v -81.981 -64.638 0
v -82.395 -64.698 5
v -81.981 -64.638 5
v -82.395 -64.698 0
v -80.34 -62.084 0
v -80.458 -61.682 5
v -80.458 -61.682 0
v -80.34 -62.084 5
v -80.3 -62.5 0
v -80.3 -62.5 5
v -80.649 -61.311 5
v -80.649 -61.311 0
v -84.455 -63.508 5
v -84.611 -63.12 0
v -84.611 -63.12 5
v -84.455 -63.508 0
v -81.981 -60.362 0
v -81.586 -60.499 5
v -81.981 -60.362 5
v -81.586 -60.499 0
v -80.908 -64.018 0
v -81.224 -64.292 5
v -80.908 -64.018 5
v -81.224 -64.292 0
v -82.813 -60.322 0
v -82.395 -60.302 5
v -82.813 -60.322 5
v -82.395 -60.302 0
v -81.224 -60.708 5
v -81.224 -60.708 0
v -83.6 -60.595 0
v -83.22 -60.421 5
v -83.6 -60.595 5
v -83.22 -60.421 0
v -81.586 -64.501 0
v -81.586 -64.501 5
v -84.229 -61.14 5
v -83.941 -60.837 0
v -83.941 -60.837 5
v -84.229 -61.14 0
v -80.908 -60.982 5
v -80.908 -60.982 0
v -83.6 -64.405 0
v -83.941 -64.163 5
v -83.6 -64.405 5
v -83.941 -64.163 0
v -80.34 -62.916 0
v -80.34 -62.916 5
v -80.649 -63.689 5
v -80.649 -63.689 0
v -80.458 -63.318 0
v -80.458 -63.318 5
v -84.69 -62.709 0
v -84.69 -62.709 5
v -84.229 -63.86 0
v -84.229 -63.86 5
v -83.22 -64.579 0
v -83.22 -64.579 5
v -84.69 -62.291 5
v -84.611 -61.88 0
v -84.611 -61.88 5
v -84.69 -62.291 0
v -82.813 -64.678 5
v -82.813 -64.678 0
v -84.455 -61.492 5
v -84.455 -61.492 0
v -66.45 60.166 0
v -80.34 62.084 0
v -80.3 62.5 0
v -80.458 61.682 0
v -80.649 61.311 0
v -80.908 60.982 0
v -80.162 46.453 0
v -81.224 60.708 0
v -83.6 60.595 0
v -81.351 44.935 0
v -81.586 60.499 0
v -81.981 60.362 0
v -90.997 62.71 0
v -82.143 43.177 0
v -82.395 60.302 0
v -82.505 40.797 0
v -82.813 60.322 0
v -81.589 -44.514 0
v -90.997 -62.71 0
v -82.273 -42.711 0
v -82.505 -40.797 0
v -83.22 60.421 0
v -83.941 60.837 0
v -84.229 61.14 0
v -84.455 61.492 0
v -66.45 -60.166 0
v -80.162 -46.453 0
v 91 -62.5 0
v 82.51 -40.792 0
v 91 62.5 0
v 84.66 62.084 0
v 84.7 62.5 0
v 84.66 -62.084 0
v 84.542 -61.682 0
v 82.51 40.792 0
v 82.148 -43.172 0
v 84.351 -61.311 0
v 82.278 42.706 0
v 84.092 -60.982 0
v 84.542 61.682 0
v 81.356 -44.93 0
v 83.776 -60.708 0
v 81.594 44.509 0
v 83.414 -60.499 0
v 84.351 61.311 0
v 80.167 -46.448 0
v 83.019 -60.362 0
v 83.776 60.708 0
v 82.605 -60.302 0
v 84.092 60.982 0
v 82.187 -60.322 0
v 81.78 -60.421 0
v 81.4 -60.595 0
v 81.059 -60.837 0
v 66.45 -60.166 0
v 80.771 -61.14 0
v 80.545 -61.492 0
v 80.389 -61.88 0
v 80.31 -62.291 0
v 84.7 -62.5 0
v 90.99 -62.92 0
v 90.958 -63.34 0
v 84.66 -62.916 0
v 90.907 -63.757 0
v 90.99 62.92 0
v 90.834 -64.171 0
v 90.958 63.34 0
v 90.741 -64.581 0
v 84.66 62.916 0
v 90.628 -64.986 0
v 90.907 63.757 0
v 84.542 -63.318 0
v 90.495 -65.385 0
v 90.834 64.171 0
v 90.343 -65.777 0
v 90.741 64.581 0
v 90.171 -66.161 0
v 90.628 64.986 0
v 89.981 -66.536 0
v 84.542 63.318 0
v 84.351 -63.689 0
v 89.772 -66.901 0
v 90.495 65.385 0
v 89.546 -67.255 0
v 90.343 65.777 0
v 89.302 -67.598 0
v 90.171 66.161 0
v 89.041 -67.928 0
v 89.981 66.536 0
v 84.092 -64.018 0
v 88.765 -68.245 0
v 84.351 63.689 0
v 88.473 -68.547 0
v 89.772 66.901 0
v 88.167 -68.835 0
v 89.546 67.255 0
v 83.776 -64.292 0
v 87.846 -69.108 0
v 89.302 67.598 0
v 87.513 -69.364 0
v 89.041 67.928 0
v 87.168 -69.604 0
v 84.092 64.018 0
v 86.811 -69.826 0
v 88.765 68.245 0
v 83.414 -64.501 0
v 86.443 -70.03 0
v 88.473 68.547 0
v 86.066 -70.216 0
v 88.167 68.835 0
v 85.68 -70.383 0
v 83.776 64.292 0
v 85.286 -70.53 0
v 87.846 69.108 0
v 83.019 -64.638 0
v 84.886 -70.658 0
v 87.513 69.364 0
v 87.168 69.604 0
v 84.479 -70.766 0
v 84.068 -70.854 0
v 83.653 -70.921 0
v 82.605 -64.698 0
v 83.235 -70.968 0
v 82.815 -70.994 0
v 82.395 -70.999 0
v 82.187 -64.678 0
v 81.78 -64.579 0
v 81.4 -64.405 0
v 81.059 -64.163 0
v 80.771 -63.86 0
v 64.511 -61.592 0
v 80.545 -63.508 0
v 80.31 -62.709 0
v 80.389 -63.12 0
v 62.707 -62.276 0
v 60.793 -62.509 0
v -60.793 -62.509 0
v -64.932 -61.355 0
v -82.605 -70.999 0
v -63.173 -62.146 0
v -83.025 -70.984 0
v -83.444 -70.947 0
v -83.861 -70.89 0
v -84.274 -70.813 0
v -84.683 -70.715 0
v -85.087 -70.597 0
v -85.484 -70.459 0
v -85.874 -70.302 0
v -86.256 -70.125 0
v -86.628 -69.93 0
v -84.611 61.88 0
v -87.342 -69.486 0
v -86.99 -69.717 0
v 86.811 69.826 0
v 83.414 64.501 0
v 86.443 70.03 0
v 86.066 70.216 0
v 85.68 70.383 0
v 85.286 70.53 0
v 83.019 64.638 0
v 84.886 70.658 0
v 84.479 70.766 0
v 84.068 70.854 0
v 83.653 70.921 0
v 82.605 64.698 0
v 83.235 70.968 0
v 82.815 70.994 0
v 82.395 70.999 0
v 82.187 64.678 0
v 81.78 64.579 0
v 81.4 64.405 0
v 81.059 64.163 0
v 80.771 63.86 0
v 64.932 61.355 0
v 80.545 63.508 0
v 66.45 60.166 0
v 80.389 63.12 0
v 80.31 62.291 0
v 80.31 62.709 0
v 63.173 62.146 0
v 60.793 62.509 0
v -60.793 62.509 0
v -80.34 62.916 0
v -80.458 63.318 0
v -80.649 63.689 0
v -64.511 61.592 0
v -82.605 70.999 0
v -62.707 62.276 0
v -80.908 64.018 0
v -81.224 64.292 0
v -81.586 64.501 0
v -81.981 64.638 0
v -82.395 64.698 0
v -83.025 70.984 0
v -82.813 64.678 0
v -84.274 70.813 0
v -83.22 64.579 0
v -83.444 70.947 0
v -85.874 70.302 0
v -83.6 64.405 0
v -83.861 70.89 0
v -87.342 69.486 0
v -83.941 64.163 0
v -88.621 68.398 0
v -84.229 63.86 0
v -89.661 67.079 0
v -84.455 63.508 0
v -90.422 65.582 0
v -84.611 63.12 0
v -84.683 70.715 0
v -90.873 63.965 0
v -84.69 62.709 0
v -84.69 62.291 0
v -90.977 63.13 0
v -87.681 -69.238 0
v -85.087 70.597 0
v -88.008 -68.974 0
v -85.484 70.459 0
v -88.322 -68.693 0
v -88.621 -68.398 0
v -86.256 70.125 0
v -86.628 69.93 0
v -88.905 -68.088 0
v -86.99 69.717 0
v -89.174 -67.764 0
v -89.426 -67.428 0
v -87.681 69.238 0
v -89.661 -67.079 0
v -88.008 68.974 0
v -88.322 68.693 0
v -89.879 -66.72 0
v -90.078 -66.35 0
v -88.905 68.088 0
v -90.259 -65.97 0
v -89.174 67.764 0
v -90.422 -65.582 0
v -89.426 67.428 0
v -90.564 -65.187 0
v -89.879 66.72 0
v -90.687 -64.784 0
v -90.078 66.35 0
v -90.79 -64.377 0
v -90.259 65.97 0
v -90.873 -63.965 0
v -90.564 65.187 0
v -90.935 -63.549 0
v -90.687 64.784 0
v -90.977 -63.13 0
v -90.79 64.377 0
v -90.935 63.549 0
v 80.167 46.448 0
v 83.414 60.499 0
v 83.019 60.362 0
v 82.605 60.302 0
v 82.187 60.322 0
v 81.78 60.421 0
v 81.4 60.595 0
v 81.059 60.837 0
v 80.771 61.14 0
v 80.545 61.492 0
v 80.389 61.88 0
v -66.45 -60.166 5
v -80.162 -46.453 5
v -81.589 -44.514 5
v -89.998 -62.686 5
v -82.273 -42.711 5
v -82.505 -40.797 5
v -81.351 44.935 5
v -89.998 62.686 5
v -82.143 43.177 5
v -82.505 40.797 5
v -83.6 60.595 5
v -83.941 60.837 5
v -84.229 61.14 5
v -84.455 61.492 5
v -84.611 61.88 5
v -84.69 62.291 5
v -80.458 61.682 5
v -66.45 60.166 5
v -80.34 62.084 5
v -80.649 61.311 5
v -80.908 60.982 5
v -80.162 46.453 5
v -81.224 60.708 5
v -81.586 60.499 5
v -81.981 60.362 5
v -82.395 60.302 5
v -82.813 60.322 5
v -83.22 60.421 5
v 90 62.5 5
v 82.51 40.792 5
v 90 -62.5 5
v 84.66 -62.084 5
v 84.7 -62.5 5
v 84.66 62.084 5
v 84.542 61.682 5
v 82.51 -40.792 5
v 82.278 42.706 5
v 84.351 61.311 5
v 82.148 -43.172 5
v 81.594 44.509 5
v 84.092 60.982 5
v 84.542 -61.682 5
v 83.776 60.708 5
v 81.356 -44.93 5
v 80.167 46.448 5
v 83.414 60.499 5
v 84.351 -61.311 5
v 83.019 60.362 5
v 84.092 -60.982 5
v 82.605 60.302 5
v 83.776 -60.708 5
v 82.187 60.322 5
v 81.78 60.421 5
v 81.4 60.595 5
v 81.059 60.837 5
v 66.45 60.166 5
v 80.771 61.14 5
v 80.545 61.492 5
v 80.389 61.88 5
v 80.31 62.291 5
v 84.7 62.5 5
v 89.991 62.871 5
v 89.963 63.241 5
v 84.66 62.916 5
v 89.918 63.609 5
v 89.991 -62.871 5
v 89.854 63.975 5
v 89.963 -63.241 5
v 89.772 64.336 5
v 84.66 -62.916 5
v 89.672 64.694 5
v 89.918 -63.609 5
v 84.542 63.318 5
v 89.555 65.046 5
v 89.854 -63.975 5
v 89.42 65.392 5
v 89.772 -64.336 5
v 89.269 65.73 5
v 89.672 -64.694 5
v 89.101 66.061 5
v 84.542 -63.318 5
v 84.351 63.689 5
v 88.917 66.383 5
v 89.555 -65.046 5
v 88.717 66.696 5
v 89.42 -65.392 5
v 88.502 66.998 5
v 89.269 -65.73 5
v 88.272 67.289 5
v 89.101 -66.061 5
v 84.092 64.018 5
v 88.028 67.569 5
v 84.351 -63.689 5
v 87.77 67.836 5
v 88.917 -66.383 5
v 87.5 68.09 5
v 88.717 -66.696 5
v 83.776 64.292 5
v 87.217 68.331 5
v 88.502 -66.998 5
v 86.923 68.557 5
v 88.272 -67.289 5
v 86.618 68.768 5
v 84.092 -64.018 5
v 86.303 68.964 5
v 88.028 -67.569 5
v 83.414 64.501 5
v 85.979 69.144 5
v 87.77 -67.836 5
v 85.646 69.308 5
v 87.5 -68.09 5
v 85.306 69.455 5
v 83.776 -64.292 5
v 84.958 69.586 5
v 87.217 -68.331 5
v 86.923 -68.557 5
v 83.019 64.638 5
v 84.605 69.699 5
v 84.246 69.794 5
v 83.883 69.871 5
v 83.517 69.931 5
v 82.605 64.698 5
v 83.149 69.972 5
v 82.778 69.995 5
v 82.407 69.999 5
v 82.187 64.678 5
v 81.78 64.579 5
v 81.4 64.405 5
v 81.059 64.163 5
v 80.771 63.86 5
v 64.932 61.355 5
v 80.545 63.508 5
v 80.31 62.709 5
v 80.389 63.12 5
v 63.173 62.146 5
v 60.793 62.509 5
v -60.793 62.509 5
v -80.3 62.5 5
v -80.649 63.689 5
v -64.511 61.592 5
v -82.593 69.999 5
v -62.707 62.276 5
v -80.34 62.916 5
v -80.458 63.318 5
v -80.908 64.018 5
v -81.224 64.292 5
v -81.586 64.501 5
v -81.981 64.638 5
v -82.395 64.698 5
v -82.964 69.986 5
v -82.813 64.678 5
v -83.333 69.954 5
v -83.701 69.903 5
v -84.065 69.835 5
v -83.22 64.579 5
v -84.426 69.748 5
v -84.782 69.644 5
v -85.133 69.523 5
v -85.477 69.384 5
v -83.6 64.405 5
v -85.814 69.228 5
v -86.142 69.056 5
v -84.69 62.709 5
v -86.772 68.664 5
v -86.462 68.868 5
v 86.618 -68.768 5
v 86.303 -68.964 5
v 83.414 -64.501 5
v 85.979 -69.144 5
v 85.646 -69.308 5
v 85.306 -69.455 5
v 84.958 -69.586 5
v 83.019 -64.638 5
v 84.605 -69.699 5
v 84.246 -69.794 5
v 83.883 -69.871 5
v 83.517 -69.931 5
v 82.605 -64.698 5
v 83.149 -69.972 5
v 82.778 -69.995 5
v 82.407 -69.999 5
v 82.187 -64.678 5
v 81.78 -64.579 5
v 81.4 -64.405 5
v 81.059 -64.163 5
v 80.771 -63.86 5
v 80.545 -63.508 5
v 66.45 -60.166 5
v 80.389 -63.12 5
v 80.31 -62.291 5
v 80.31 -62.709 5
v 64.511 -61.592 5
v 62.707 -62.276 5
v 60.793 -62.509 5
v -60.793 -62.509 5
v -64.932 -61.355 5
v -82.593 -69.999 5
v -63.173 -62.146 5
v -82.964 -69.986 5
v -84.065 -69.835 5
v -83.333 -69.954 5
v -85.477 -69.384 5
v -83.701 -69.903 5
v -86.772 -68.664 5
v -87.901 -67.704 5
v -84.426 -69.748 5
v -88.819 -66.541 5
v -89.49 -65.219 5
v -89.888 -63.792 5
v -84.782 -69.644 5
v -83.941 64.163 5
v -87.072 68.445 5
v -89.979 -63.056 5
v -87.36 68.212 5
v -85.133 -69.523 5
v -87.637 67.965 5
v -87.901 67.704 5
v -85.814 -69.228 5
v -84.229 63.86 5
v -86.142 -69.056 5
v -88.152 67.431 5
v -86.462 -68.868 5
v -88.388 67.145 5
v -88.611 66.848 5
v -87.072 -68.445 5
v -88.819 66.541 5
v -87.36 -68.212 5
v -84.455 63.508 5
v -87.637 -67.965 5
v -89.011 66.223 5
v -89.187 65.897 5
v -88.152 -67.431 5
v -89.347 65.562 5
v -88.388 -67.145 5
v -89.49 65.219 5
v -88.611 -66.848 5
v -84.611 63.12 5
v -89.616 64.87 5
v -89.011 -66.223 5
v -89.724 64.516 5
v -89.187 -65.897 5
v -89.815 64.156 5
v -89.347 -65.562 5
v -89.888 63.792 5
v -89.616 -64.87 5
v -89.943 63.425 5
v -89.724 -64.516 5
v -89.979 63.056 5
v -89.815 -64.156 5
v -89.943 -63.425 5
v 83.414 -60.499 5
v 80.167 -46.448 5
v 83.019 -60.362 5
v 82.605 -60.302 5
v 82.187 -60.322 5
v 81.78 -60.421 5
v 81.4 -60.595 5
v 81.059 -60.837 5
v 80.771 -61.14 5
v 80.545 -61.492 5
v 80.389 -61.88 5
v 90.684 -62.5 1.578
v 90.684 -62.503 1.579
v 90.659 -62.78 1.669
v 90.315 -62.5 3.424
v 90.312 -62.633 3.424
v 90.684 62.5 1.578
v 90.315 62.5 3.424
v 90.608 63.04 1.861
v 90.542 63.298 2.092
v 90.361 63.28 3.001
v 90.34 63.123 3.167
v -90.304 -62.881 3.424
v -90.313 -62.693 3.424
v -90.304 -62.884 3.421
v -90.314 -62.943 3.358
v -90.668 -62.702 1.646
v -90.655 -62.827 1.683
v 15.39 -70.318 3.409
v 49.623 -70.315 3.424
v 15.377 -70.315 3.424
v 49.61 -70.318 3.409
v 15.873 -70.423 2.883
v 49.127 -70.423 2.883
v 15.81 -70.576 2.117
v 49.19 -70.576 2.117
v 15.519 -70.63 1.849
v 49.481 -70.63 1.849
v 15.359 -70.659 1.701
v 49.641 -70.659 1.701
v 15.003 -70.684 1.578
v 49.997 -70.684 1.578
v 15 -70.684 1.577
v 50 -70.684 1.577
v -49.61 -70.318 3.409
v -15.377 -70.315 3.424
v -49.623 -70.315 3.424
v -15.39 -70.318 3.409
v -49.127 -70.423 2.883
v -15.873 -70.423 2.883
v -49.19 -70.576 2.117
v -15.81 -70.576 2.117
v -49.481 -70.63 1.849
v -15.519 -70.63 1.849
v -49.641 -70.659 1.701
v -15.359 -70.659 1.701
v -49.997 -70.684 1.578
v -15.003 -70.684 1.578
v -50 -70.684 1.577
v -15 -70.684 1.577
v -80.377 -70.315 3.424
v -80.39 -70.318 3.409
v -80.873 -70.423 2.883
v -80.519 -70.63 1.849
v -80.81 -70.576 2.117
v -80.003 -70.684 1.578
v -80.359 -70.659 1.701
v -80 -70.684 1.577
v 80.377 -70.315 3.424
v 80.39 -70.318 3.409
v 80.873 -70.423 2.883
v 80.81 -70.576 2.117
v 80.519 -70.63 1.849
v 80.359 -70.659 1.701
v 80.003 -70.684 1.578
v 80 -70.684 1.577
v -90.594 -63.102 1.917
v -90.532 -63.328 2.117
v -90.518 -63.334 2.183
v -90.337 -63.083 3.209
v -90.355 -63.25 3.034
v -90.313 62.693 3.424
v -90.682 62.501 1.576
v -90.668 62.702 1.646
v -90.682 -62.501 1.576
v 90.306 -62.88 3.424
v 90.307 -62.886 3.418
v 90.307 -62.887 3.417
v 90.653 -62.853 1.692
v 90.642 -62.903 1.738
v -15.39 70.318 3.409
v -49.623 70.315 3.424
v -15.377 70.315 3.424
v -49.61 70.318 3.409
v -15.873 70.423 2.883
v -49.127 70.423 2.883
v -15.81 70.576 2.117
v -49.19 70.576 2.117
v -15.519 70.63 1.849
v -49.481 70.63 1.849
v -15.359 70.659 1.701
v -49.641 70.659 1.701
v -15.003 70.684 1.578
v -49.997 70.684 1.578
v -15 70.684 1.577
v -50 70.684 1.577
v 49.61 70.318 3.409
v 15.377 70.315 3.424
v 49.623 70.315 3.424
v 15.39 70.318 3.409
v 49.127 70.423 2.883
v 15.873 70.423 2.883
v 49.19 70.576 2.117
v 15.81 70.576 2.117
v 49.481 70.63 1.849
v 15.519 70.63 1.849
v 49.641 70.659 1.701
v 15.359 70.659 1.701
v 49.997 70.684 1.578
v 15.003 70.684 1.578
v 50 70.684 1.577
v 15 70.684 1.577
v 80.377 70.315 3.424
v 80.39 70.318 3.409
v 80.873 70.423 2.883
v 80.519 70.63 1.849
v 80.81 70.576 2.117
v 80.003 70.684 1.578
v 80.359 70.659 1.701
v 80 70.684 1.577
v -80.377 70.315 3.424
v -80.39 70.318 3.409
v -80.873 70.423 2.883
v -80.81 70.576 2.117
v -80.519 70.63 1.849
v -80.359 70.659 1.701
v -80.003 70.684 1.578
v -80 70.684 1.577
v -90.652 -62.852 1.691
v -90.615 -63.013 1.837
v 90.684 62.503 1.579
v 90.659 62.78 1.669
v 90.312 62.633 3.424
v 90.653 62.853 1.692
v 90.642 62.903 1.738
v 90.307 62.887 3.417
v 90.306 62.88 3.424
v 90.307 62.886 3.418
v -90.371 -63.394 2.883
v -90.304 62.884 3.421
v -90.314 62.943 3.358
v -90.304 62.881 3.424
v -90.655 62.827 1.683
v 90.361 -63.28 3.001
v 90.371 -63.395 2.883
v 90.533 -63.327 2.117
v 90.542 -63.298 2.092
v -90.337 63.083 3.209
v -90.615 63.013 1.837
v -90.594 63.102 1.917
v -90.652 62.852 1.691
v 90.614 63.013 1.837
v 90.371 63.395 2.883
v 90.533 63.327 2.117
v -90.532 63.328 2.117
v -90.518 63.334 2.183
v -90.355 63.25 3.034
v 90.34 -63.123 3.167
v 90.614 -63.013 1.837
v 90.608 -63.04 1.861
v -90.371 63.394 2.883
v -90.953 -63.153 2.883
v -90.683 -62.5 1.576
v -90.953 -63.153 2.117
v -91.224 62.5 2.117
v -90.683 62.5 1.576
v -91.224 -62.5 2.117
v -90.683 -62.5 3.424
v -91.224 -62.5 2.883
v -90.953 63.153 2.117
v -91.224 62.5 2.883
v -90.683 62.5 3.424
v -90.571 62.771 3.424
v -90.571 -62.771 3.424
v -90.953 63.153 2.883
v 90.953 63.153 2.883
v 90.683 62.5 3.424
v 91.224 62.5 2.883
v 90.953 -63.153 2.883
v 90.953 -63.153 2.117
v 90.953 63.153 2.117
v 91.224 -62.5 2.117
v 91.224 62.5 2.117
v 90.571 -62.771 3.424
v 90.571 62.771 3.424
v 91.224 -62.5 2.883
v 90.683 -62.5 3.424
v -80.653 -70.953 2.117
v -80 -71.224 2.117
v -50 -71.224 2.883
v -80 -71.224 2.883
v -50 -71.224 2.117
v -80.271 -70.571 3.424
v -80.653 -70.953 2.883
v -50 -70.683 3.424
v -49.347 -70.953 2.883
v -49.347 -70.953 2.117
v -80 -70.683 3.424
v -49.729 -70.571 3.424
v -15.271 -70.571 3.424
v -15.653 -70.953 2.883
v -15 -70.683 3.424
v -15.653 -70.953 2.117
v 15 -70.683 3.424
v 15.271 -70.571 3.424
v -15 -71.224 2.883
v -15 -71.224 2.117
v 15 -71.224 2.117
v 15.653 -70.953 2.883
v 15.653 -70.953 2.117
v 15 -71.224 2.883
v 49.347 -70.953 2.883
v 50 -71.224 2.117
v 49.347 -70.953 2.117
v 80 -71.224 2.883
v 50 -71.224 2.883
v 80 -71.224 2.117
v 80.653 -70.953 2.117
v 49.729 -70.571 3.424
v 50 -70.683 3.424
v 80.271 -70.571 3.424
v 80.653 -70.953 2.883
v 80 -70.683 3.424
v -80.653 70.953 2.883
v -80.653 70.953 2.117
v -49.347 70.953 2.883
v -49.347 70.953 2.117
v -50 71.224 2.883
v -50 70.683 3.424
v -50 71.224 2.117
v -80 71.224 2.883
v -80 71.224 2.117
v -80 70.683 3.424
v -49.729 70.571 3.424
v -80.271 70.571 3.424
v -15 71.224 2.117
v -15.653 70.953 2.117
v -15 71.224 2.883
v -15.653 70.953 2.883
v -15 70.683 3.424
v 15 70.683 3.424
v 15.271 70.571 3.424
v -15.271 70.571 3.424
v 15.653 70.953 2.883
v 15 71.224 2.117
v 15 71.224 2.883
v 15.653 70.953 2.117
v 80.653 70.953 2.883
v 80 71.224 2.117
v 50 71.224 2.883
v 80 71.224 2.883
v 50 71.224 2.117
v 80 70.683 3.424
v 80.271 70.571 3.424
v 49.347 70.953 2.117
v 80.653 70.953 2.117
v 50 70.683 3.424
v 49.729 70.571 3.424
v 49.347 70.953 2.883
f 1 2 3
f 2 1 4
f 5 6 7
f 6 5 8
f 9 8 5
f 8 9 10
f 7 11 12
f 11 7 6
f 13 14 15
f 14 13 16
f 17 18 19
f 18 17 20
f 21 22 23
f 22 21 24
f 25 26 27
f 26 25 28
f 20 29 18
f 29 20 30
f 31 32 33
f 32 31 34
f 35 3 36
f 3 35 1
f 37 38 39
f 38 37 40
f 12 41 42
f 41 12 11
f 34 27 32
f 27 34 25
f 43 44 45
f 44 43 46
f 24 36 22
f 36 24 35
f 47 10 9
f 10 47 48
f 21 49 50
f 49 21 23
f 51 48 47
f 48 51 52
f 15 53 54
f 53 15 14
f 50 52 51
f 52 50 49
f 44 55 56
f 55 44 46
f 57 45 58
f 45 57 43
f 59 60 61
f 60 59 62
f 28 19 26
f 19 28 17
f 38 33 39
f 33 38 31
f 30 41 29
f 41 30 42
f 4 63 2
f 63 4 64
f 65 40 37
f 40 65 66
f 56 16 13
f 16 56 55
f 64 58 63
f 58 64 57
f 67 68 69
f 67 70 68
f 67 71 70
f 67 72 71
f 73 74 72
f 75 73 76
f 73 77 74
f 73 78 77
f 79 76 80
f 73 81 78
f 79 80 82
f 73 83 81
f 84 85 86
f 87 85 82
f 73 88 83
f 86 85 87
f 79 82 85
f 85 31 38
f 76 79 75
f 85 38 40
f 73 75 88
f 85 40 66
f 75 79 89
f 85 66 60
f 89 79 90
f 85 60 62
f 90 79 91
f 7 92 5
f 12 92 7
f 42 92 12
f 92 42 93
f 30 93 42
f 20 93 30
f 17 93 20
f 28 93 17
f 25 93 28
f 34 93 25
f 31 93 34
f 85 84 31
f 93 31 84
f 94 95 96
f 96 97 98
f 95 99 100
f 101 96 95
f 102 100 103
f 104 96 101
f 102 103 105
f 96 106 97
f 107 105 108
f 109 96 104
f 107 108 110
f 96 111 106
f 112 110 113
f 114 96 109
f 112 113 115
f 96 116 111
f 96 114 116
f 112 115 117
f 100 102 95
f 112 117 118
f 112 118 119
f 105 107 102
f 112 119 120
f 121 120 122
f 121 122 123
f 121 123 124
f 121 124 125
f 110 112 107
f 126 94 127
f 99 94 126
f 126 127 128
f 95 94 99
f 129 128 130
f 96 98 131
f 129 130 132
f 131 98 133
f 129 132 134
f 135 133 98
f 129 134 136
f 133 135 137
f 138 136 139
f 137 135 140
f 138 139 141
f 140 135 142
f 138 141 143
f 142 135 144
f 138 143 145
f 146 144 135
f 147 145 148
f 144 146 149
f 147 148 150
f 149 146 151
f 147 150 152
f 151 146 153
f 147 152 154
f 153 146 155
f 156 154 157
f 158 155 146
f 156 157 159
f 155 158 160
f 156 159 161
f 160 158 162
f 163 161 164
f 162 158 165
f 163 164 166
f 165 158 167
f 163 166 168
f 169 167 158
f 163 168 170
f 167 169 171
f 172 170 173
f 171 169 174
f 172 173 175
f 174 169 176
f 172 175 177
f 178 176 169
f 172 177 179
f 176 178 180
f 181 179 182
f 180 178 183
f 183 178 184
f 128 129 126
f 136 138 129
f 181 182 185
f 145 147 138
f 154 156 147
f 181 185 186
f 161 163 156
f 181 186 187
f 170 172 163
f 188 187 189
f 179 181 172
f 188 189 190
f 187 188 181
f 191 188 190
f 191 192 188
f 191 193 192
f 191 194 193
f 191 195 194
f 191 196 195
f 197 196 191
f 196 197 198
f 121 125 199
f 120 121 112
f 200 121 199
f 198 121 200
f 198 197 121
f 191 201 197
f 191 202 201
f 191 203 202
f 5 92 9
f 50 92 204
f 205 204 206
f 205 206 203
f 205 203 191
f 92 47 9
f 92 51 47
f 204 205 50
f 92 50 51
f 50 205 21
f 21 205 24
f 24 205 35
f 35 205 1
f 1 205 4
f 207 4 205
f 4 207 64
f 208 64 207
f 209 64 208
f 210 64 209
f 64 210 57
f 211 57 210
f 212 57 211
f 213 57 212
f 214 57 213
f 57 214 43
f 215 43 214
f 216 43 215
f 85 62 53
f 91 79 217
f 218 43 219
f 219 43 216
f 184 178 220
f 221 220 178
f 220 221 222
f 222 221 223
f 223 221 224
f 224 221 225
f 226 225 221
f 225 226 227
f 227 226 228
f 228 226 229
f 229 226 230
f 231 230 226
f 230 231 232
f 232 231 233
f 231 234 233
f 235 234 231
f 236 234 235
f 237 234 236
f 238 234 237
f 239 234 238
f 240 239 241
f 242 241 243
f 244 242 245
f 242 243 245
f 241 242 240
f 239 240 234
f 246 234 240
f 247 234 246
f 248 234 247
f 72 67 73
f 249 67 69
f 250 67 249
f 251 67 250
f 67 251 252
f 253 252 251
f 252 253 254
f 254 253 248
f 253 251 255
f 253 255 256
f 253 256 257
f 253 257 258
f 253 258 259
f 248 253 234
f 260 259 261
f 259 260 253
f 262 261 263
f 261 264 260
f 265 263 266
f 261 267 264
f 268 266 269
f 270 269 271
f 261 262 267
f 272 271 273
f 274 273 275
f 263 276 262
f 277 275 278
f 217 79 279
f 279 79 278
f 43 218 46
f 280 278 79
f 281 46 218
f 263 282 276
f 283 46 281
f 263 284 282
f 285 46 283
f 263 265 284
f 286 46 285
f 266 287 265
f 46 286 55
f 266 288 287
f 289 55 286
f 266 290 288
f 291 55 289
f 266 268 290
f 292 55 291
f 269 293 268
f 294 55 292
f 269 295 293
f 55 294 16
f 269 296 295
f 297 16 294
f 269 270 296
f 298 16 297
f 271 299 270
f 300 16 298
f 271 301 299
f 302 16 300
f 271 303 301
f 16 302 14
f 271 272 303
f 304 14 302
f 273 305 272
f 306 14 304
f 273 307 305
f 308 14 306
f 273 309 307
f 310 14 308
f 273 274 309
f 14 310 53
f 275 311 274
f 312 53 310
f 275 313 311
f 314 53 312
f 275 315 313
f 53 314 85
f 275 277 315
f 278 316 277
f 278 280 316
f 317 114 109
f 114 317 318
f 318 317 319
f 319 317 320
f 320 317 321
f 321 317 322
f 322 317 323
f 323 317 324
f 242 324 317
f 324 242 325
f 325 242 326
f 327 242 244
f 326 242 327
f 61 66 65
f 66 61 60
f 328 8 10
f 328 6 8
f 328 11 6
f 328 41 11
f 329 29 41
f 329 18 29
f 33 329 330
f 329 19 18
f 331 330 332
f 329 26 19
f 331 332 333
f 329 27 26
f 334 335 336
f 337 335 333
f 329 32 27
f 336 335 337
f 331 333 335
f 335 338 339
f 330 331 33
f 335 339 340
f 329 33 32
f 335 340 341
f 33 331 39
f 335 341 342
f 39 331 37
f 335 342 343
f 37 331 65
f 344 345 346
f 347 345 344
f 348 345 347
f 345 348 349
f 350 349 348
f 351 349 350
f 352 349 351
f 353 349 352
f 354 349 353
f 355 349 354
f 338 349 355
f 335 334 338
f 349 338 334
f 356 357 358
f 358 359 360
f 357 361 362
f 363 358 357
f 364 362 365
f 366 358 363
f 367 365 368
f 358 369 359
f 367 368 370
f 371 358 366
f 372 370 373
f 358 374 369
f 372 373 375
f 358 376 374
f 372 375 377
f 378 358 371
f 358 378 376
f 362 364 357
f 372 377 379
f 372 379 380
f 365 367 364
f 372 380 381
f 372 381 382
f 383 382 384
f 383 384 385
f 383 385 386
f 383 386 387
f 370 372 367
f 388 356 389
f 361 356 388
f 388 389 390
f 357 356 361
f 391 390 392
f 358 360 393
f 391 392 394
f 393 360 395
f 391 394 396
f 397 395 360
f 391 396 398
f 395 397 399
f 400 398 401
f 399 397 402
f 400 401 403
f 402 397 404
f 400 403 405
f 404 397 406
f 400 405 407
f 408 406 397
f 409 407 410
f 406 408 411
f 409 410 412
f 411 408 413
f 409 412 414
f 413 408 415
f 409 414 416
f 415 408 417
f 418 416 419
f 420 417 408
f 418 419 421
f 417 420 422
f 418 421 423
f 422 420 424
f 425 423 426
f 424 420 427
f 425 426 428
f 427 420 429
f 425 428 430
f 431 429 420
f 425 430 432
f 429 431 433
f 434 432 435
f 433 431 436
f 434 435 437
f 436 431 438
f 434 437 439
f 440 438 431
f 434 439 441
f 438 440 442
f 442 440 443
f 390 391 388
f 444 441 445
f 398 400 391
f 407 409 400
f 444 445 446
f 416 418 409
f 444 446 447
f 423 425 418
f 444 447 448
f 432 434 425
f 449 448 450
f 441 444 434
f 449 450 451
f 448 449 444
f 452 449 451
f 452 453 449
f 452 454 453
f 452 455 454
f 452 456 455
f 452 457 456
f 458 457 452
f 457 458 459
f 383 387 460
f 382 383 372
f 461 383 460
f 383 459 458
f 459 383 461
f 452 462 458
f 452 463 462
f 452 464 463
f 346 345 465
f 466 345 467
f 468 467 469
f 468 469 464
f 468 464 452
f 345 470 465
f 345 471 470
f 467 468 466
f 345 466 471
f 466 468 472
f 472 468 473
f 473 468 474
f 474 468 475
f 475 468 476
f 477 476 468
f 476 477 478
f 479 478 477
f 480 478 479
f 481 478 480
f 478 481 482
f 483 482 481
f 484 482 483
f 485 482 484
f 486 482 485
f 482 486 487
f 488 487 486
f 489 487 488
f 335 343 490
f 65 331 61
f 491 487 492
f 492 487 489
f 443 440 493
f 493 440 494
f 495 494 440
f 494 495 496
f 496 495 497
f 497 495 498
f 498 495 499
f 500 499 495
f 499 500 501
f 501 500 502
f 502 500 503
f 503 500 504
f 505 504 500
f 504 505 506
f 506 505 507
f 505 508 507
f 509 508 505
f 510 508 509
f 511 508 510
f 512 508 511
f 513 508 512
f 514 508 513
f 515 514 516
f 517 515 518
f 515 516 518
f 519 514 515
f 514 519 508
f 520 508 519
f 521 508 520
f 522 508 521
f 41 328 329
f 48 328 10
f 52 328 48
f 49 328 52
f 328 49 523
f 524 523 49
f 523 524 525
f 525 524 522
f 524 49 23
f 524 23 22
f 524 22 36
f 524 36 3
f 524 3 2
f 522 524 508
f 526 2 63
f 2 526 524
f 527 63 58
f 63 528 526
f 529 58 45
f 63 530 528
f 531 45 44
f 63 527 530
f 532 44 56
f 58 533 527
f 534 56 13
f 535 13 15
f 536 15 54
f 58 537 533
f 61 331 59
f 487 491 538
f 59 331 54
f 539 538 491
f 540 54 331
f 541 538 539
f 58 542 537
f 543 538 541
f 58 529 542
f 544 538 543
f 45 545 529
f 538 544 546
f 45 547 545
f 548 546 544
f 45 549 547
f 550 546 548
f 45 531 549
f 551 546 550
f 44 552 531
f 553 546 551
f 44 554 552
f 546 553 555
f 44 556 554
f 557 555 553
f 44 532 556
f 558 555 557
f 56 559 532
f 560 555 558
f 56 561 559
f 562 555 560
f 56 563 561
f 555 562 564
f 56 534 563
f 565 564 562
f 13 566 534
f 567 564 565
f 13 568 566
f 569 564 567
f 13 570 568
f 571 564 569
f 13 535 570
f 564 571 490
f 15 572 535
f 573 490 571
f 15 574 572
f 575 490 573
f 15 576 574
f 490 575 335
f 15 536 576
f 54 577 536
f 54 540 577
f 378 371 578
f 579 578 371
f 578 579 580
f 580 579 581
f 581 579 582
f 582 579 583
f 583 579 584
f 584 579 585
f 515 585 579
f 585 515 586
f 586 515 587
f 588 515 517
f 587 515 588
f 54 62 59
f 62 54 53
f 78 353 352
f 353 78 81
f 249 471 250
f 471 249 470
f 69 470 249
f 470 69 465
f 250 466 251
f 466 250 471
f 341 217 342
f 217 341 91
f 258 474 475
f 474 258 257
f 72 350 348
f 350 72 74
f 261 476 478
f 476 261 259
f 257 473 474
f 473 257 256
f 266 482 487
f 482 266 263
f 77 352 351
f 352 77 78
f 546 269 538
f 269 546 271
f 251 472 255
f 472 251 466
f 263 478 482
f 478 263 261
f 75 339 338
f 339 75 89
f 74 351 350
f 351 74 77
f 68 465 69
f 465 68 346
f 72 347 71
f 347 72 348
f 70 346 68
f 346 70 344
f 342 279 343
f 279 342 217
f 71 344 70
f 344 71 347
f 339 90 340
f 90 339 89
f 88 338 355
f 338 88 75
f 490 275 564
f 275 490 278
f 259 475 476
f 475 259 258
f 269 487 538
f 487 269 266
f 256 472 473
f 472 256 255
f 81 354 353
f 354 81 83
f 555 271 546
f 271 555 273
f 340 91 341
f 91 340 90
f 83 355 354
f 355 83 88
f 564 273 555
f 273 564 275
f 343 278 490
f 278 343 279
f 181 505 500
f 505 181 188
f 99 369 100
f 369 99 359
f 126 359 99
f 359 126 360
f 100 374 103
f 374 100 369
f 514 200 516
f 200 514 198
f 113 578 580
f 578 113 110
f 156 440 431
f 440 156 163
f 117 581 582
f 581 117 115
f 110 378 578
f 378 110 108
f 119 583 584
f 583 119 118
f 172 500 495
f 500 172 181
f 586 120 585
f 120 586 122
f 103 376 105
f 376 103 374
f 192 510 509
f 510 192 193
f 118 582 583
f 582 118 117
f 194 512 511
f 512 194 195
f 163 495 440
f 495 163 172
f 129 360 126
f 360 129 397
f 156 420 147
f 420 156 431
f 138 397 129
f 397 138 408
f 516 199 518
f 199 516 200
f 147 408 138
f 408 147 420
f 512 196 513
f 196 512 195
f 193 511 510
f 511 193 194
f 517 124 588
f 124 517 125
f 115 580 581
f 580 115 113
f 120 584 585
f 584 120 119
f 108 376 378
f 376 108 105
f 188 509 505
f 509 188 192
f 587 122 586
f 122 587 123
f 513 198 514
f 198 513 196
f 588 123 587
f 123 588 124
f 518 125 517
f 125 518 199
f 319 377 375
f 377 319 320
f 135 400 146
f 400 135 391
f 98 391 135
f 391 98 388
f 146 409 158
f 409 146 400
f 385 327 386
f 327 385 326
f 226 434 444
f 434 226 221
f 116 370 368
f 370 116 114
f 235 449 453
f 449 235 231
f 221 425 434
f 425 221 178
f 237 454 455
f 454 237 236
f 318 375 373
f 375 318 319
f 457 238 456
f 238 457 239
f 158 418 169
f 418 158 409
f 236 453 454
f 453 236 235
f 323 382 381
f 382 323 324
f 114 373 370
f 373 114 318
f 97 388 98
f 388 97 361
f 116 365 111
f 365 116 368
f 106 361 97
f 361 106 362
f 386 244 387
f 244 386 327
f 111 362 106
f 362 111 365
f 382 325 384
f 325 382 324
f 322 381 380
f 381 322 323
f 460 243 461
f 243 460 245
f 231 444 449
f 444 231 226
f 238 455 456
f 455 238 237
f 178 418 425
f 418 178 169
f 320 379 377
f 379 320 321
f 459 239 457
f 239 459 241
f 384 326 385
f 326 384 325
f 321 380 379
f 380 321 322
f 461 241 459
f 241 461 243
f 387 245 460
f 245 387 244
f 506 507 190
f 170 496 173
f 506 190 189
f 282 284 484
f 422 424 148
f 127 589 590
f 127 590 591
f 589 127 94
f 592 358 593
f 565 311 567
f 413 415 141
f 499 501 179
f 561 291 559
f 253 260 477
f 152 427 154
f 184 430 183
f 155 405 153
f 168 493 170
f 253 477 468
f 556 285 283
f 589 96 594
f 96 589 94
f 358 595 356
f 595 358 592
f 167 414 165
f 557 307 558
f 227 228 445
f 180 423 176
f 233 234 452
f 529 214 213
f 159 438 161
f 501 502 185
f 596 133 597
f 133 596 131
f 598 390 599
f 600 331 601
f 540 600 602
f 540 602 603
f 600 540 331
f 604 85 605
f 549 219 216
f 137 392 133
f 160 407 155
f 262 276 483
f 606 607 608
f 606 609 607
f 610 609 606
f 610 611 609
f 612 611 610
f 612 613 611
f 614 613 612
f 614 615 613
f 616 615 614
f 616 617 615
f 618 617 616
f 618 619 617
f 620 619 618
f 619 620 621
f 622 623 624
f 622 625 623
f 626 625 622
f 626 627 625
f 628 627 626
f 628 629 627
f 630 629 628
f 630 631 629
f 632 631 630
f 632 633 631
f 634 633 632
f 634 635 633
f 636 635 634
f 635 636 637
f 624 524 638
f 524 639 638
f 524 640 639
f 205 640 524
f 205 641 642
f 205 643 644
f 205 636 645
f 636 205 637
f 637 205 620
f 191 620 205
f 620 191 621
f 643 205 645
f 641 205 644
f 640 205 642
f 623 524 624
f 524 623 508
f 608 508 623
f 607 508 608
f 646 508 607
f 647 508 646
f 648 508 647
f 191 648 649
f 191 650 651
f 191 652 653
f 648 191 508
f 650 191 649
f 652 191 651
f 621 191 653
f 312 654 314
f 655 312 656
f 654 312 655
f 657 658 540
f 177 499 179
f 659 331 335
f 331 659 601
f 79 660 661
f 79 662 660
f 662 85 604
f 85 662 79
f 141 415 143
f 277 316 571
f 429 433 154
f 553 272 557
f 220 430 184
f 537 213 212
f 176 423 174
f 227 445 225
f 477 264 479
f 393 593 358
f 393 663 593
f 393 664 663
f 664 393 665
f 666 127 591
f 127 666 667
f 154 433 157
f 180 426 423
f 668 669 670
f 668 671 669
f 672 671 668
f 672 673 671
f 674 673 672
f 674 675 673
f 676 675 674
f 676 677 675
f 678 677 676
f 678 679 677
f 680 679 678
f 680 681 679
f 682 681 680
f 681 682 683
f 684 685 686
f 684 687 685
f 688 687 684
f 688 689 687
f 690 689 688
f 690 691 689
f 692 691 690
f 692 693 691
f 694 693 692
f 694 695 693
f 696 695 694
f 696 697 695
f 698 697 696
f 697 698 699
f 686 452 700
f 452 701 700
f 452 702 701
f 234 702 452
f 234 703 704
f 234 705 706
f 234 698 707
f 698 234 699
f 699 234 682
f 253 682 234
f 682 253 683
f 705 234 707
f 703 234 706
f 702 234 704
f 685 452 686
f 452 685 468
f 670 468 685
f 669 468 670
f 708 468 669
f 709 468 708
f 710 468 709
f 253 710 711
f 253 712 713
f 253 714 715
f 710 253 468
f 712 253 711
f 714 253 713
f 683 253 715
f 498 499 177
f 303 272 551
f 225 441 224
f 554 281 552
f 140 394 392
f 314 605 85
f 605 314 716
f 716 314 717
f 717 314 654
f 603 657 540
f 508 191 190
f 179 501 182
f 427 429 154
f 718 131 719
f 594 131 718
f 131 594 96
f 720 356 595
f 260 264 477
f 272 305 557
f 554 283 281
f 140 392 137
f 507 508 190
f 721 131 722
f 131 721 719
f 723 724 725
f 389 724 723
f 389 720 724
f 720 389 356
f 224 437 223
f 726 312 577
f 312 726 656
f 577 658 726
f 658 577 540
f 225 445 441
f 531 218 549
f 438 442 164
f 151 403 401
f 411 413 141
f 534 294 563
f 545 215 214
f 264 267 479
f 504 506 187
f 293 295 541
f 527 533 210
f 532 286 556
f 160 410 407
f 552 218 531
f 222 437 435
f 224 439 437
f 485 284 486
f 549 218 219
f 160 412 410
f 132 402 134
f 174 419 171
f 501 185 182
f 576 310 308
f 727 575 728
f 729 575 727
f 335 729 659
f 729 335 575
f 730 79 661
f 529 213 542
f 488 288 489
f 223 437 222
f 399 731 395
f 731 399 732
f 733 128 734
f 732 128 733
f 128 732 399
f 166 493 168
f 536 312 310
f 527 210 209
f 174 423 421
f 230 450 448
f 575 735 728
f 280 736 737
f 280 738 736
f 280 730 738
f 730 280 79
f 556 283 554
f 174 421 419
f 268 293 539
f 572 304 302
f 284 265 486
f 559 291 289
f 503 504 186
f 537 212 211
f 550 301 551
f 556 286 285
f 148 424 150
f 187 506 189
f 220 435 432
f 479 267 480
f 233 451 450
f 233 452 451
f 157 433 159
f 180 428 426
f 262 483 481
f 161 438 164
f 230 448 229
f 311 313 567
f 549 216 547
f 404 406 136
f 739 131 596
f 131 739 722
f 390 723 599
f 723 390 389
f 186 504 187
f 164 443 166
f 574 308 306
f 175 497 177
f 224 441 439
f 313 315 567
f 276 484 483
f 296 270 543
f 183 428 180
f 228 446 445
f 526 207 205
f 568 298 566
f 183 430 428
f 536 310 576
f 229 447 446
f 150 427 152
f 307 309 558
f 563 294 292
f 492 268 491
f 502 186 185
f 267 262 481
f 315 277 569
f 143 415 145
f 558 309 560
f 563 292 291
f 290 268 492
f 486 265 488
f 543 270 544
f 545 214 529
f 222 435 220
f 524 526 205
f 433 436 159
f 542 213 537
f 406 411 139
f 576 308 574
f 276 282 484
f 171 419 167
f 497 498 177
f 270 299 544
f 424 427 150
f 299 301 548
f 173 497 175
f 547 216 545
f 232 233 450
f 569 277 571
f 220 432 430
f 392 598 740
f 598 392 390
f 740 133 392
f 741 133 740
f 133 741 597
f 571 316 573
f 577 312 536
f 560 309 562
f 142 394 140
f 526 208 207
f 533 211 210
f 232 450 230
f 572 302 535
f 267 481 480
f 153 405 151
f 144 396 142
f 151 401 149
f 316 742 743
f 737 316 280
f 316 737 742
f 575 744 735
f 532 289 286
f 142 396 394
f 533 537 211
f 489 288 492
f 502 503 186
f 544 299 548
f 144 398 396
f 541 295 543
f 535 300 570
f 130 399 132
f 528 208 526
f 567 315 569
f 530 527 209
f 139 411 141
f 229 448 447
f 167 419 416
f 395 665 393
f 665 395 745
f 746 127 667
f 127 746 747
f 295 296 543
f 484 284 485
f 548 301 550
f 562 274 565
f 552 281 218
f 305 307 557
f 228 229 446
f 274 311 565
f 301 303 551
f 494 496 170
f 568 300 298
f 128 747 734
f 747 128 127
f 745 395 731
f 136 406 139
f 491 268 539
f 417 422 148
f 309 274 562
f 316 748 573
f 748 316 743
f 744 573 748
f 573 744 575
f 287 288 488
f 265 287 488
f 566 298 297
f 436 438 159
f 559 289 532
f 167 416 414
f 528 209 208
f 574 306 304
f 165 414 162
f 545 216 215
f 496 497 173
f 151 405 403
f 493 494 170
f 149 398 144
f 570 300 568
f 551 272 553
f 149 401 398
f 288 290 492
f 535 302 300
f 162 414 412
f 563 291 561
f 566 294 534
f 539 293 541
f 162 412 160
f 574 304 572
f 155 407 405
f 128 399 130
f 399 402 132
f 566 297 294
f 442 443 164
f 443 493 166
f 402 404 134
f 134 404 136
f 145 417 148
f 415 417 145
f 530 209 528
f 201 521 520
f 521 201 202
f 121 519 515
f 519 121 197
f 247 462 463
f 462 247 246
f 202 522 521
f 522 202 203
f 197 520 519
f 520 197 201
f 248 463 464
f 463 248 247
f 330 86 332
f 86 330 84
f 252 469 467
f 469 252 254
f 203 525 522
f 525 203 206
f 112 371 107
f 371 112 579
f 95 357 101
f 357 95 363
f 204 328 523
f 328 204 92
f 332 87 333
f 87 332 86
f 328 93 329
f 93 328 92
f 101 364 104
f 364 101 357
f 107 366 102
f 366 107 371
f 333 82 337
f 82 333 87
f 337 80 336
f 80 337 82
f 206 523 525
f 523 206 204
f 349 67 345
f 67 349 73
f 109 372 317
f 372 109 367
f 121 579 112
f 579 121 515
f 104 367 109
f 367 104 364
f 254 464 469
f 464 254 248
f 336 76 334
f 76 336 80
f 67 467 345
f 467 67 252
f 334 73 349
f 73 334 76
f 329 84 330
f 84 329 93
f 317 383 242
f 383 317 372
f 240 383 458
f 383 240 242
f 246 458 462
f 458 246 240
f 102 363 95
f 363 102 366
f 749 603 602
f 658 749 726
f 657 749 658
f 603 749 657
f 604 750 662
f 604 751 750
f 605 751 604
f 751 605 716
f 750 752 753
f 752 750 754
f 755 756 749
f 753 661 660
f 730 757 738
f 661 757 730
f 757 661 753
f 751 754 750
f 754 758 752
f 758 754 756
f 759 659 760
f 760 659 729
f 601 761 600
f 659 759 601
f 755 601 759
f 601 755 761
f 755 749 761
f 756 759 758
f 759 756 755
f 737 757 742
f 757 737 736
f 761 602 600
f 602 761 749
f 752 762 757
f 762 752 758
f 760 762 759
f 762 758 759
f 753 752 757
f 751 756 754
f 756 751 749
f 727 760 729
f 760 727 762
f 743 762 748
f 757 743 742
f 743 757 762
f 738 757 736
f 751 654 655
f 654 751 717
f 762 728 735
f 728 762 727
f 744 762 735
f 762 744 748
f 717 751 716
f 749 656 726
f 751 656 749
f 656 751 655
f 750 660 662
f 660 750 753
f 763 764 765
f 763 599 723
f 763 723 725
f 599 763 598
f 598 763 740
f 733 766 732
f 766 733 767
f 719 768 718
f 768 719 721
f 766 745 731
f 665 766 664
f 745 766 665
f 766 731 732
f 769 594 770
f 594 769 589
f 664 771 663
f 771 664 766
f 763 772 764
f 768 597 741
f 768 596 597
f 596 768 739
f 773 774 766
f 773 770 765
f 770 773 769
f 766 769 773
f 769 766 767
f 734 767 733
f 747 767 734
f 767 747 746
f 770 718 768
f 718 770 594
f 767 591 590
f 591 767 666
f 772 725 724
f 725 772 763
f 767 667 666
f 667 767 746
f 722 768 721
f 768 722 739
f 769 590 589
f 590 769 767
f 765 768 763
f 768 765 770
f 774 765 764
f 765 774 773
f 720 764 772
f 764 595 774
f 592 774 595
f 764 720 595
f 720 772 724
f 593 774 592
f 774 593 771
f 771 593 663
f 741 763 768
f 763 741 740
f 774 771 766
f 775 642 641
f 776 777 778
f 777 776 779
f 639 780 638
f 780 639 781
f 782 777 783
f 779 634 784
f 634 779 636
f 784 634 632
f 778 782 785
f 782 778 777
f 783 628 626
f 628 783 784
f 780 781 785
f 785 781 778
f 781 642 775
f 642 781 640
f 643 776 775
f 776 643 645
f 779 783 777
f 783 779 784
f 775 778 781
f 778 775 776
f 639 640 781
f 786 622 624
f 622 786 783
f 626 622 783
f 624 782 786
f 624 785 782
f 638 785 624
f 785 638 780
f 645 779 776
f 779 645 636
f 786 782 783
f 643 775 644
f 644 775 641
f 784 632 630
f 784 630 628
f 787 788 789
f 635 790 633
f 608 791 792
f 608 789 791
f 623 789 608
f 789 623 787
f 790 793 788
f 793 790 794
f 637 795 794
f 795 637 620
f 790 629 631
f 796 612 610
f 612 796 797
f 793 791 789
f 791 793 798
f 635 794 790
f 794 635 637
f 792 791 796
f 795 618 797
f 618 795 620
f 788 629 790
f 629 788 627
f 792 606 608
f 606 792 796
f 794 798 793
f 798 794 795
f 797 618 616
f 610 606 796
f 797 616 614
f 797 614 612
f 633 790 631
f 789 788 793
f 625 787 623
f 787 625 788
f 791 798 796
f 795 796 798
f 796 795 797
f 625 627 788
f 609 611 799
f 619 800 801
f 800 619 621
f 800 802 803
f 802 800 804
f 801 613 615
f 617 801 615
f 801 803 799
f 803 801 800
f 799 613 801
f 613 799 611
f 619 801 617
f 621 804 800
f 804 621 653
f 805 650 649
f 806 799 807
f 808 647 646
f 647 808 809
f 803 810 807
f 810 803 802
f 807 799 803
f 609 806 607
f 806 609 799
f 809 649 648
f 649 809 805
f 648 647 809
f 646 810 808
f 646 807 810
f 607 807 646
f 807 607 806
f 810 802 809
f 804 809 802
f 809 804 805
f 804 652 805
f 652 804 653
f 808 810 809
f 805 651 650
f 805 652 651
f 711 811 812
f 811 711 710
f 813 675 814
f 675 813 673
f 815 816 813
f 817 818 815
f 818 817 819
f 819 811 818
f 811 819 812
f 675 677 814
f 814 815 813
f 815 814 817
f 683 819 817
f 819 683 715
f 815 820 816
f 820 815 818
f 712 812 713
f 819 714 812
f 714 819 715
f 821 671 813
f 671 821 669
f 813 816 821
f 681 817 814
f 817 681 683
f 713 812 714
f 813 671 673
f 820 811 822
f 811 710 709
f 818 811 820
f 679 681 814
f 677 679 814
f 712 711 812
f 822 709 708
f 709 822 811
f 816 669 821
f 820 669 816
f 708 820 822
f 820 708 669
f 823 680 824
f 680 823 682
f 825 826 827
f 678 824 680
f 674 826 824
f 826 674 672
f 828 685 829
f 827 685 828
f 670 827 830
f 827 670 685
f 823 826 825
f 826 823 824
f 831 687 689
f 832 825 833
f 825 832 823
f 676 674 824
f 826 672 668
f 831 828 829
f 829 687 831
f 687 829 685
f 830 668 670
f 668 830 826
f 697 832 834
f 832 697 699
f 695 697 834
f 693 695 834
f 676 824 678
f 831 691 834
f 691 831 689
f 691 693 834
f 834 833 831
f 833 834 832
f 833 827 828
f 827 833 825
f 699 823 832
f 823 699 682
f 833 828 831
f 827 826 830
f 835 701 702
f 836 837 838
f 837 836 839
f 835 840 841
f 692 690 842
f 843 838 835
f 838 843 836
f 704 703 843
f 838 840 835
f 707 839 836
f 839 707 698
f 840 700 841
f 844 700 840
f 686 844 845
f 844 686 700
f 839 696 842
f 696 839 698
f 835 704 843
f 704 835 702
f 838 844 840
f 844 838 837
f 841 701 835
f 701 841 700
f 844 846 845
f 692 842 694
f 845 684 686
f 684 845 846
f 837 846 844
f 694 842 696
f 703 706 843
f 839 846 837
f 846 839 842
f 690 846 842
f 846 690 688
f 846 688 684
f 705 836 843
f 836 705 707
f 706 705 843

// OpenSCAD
xOS = 165;
yOS = 125;

screwR = 2.2;
cnrR = 7.5;
edgeChamfer = 1;
depth = 5;

snapR = 1;
snapOS = 0.3;
hSnapLen = 30;
hSnapOS = 65;

module corners(xOS,yOS,topR,baseR){

    for (x = [-xOS/2,xOS/2]){
        for (y = [-yOS/2,yOS/2]){
            translate([x,y,0]) cylinder(h = depth, r1 = baseR, r2 = topR, $fn = baseR * 15);
        }
    }
}

module bigVoid(){
    
    module cornerChamfer(){
        for (x = [-xOS/2,xOS/2]){
            for (y = [-yOS/2,yOS/2]){
                translate([x,y,0]) rotate([0,0,45]) cube(size = [26,26,1000], center = true);
            }
        }
    } 
    linear_extrude(height = depth * 2){
        offset(8) offset(-8) projection(cut=true) difference(){
            hull() corners(xOS,yOS,0.01,0.01);
            cornerChamfer();
        }
    }
}

module build(){
    difference(){
        hull() corners(xOS,yOS,cnrR,cnrR + edgeChamfer);
        corners(xOS,yOS,screwR,screwR);
        bigVoid();
    }
}

build();

for (x = [-1,1]){
    edgeOS = x * (snapOS + xOS / 2 + cnrR);
    #hull() for (y = [-yOS/2,yOS/2]){
        translate([edgeOS,y,depth/2]) sphere(r = snapR,$fn = 8);
    }
}

for (y = [-1,1]){
    edgeOS = y * (snapOS + yOS / 2 + cnrR);
    for (hSOS = [-hSnapOS,0,hSnapOS]){
        #hull() for (x = [-hSnapLen/2,hSnapLen/2]){
            translate([x + hSOS,edgeOS,depth/2]) sphere(r = snapR,$fn = 8);
        }
    }
}
